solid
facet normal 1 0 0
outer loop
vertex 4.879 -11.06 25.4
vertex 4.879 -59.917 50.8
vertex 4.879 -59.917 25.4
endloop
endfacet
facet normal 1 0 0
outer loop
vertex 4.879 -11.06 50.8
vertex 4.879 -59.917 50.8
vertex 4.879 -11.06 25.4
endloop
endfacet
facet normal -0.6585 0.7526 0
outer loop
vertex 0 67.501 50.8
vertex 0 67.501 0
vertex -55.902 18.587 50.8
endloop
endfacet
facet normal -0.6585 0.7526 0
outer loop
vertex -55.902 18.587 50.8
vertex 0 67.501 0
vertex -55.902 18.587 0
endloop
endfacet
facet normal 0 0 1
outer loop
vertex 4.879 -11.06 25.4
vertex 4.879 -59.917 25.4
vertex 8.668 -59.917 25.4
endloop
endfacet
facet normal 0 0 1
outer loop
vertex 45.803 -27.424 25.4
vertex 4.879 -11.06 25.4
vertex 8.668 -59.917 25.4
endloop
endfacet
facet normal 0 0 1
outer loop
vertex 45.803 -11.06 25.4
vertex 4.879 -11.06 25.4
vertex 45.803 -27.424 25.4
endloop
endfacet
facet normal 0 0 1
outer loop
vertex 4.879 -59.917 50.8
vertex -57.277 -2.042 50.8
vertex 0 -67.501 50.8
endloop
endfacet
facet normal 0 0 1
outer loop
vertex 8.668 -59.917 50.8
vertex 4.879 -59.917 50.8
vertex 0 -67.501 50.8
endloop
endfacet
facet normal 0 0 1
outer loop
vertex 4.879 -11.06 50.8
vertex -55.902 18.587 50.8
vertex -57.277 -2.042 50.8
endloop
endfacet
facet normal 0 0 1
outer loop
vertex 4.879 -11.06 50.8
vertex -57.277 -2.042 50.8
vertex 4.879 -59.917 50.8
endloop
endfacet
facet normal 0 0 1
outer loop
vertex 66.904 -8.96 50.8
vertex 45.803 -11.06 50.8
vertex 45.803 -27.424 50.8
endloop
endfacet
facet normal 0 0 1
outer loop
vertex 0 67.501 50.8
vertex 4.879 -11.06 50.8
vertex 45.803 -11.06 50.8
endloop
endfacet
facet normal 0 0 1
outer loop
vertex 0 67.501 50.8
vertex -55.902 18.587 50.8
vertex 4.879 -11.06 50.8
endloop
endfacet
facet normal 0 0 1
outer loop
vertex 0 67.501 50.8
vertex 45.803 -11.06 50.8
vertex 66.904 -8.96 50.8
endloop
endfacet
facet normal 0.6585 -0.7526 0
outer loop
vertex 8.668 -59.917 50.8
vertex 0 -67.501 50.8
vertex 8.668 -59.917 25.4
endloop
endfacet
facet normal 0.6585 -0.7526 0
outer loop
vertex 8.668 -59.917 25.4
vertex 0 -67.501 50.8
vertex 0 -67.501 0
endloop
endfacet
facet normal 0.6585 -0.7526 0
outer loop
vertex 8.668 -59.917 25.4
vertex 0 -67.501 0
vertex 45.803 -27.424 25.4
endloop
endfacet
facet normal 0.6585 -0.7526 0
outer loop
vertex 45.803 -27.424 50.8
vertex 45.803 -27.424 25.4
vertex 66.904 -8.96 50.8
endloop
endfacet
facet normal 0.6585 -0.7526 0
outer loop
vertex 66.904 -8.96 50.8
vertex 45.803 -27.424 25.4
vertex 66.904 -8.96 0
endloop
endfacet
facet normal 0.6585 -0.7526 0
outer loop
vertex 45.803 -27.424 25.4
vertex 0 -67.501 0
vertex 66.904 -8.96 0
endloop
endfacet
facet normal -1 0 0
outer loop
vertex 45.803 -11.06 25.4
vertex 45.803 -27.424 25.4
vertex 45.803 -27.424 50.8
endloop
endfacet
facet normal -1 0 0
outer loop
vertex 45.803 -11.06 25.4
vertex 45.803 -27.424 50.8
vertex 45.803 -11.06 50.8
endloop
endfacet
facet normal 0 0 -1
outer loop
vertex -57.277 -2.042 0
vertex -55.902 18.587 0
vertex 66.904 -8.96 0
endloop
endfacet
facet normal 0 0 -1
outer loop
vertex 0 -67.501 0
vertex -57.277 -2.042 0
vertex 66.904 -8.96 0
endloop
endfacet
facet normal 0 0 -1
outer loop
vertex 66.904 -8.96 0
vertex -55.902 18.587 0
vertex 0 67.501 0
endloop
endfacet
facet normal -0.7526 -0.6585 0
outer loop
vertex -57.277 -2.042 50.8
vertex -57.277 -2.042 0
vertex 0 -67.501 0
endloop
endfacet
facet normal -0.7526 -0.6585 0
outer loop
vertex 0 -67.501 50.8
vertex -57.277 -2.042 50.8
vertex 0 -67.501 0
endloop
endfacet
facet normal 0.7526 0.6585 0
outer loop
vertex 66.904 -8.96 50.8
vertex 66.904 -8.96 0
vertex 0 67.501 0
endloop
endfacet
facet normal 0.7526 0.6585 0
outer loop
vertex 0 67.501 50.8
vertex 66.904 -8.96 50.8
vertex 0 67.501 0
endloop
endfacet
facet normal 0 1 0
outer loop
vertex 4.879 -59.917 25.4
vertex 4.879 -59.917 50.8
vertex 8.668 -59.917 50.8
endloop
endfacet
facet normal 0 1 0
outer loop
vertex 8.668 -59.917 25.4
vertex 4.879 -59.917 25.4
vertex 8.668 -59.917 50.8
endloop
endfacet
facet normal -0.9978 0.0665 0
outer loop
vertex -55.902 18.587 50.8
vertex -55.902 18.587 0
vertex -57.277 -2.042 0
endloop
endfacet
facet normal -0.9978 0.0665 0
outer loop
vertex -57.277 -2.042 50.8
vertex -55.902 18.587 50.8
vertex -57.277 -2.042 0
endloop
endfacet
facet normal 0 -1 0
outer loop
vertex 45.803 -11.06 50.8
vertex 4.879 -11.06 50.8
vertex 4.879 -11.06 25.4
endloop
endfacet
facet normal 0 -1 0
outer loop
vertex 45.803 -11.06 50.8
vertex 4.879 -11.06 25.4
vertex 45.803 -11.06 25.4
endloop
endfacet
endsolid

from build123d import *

# Parameters (mm, degrees)
F1_DEPTH = 50.8
F2_W     = 40.923903
F2_H     = 48.857377
F3_DEPTH = 25.4


with BuildPart() as f1:
    # F0 (on Top) → F1 (new body)
    with BuildSketch(Plane.XY):
        Polygon((0, 67.501426), (-55.901939, 18.58723), (-57.277205, -2.041763), (0, -67.501426), (66.904068, -8.960366), align=None)
    extrude(amount=F1_DEPTH)

    # F2 (on face) → F3 (cut)
    with BuildSketch(Plane.XY.offset(50.8)):
        with Locations((25.341062, -35.488515)):
            Rectangle(F2_W, F2_H)
    extrude(amount=-F3_DEPTH, mode=Mode.SUBTRACT)


solid = f1.part
